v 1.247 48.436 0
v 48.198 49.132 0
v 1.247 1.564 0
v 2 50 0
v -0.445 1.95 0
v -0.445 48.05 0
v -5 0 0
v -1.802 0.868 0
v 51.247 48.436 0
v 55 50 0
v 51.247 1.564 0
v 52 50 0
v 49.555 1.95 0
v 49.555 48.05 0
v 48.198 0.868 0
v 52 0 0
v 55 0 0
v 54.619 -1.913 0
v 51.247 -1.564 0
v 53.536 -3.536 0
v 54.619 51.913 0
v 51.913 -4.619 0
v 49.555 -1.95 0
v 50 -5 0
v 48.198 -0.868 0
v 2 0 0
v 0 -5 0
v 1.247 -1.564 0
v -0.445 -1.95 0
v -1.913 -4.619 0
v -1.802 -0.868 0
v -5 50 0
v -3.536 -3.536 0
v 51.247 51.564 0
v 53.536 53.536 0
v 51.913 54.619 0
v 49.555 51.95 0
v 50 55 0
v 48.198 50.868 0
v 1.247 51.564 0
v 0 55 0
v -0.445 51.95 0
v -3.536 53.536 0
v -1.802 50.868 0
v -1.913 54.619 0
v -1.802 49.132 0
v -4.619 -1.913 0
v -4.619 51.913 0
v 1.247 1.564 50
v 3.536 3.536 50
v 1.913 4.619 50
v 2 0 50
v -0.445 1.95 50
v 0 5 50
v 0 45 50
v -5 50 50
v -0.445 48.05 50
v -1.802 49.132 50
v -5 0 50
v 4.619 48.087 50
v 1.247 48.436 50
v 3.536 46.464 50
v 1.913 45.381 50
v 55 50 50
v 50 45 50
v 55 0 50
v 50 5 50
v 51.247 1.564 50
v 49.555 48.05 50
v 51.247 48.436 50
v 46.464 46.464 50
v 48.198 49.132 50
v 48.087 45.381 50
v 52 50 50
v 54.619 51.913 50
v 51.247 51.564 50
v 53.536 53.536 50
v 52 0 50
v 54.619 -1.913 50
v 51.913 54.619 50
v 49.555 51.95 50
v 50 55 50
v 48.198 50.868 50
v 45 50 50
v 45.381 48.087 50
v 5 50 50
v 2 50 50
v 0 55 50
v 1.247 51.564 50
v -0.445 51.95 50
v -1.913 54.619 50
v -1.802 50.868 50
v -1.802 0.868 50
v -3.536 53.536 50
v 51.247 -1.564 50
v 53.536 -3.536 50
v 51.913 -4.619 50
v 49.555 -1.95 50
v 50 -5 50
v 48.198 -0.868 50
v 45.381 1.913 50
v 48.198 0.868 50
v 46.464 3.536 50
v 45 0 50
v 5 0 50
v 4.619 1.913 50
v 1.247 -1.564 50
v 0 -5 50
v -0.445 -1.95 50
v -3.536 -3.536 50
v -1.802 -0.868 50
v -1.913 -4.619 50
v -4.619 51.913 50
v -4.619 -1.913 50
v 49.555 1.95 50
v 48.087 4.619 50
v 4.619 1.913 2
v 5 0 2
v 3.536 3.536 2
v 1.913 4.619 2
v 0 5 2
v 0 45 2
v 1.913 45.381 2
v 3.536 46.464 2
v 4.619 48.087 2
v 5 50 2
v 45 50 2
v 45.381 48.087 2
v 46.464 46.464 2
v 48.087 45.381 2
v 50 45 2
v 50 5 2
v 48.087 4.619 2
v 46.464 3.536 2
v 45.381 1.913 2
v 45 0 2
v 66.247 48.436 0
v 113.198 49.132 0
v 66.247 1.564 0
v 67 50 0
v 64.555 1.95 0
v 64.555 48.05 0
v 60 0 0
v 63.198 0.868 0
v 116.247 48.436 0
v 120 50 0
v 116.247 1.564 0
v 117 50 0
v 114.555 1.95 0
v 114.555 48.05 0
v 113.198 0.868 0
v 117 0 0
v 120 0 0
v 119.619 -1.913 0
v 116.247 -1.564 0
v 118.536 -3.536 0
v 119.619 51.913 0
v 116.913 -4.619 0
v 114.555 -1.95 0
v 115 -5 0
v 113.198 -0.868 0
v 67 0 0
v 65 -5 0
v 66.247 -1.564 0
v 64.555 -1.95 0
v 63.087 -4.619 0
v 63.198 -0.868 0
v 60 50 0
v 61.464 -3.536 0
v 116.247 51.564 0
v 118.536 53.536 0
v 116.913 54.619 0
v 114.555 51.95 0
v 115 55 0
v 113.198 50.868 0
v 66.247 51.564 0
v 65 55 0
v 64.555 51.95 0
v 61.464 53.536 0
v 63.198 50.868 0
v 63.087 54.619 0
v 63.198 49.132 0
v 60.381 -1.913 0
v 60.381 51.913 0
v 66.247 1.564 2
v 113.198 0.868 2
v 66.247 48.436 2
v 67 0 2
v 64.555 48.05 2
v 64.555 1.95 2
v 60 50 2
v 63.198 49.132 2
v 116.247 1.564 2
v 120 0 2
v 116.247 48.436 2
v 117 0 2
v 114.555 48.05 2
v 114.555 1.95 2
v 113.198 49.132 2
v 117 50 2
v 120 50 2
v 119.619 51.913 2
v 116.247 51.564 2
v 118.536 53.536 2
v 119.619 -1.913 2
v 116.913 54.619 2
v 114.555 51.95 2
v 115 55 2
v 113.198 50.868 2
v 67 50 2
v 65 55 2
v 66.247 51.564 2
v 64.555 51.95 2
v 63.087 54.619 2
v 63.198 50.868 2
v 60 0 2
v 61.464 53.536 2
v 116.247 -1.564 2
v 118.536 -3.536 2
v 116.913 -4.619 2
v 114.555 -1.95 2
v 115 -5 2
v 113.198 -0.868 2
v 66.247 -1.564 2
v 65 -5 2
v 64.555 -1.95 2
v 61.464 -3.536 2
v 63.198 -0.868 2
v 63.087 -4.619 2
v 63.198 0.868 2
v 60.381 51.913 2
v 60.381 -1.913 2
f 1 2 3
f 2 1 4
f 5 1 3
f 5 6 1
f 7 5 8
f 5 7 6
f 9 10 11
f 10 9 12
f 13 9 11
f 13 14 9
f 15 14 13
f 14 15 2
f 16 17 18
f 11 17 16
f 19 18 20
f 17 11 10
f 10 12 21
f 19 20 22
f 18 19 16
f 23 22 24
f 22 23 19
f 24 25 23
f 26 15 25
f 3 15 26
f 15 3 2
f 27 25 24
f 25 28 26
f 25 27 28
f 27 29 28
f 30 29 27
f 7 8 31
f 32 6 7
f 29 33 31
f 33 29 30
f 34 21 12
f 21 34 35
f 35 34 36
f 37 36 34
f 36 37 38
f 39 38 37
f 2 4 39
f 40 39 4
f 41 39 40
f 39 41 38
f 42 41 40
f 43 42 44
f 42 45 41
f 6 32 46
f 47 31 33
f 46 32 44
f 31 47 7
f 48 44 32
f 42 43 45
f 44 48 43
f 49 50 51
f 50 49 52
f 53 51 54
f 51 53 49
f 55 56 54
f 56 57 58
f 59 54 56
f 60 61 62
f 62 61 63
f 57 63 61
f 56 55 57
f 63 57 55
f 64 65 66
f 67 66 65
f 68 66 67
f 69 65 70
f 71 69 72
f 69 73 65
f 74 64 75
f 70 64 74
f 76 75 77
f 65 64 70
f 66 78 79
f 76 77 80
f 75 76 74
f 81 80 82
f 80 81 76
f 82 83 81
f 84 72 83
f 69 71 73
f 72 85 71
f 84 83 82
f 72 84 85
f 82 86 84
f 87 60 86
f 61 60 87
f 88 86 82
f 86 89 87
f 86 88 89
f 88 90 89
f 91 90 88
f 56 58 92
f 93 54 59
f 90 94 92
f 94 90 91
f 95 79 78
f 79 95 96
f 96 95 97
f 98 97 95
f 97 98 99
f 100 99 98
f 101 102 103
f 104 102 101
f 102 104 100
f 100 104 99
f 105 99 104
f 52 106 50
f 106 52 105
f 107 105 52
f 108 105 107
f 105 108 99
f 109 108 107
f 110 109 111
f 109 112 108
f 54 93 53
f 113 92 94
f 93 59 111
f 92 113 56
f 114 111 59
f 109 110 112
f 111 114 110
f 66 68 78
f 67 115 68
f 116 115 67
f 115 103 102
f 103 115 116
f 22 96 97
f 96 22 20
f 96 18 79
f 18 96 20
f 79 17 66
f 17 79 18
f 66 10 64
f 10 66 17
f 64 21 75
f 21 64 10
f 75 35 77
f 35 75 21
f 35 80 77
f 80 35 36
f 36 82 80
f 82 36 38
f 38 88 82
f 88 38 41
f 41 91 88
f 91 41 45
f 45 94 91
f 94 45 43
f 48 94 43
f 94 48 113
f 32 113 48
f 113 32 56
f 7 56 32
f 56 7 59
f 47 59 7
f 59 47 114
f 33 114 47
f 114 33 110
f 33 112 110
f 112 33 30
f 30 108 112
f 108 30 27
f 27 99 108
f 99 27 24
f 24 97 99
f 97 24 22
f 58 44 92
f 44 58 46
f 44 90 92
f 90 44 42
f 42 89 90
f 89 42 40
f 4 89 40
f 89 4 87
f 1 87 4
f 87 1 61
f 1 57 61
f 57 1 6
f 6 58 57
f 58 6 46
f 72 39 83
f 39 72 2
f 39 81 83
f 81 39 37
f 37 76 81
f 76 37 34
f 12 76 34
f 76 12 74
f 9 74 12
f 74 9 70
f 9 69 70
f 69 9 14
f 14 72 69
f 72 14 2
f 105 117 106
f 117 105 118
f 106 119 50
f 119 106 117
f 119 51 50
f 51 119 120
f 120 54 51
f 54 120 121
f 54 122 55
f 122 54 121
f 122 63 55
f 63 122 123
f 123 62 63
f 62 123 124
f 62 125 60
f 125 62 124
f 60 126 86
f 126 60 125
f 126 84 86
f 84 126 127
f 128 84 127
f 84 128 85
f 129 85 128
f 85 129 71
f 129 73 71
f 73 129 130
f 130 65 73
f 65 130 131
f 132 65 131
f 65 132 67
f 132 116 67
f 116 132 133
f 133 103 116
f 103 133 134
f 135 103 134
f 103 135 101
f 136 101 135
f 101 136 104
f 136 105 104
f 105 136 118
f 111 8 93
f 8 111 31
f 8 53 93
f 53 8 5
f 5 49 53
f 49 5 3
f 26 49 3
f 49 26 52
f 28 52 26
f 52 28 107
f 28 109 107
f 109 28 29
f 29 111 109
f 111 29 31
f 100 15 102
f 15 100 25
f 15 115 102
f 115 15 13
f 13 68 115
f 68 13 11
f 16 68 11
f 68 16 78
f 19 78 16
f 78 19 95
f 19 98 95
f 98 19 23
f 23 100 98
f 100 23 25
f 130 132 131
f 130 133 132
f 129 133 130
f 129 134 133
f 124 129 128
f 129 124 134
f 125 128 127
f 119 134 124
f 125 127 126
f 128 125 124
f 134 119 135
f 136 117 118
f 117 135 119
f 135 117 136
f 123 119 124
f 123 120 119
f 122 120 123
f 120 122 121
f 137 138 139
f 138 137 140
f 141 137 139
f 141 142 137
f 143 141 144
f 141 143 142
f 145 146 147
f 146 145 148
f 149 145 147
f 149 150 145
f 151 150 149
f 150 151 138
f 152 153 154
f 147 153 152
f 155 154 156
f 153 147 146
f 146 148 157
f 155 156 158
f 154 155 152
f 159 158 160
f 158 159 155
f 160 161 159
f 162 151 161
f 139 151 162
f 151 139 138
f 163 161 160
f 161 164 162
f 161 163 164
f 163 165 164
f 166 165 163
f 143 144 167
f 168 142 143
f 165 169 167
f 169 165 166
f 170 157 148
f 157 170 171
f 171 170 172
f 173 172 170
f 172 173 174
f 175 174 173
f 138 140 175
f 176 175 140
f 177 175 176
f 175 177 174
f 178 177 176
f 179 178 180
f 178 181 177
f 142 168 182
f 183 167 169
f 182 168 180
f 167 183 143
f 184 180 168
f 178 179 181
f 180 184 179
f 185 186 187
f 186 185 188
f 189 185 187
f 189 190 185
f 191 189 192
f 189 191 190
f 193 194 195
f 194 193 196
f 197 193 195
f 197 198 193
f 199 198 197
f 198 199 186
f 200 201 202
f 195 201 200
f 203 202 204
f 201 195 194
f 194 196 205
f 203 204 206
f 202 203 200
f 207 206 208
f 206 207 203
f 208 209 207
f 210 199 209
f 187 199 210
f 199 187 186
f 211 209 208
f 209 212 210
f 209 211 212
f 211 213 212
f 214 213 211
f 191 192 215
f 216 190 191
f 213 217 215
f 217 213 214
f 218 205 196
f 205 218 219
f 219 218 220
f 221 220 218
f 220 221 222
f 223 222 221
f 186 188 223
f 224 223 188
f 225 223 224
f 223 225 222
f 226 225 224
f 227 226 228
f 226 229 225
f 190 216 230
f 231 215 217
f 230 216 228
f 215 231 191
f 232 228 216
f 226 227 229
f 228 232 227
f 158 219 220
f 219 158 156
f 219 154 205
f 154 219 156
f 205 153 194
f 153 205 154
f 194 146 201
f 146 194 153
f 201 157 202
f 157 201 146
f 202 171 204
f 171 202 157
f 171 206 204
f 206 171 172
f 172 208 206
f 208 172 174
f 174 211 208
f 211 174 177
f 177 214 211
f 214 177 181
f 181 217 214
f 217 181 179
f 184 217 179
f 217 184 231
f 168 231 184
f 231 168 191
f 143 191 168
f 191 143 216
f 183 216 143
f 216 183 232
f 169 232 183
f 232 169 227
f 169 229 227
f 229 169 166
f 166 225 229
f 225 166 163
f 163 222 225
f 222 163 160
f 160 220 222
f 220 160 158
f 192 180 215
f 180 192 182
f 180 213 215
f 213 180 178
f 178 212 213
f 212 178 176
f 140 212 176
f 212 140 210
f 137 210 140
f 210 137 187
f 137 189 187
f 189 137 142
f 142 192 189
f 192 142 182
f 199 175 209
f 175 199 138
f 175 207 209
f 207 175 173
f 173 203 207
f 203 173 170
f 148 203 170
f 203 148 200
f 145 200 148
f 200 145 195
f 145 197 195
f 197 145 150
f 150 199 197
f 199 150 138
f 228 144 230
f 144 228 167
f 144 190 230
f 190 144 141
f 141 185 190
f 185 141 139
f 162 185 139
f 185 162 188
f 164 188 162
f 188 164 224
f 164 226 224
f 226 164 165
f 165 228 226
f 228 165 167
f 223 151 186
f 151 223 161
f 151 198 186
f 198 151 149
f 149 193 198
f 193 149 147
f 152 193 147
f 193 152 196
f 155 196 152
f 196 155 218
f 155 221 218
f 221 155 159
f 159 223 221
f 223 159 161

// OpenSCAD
// [FL_INDEX: keywords="openscad, 3d_parametric, Customizer_Box_with_Lid_and_screw_holes, csg_solid" | COT="Parametric OpenSCAD design from 3DCodeverse"]
// Title: Customizer Box with Lid and screw holes

//box length
box_length = 50;

//box_breadth
box_breadth = 50;

//box height
box_height = 50;

//outer radius for rounded box
radius_outer = 5;

//radius for screw holes
radius_hole = 2;

module faceplate(l,b,r_outer,r_hole) {
	difference() {
		minkowski() {
			circle(r_outer);
			square([l,b]);
		}
		circle(r_hole);
		translate([l,0,0])circle(r_hole);
		translate([0,b,0])circle(r_hole);
		translate([l,b,0])circle(r_hole);
	}
}

module inner_shape(l,b,r_outer) {
	difference() {
		square([l,b]);
		circle(r_outer);
		translate([l,0,0])circle(r_outer);
		translate([0,b,0])circle(r_outer);
		translate([l,b,0])circle(r_outer);
	}
}

module box(l,b,h,r_outer,r_hole) {
	union() {
		linear_extrude(height = h)
		{
			difference() {
				faceplate(l,b,r_outer,r_hole);
				inner_shape(l,b,r_outer,r_hole);
			}
		}
		linear_extrude(height = 2)faceplate(l,b,r_outer,r_hole);
	}
}

box(box_length,box_breadth,box_height,radius_outer,radius_hole);
translate([box_length+2*radius_outer+5,0,0])linear_extrude(height = 2)faceplate(box_length,box_breadth,radius_outer,radius_hole);
